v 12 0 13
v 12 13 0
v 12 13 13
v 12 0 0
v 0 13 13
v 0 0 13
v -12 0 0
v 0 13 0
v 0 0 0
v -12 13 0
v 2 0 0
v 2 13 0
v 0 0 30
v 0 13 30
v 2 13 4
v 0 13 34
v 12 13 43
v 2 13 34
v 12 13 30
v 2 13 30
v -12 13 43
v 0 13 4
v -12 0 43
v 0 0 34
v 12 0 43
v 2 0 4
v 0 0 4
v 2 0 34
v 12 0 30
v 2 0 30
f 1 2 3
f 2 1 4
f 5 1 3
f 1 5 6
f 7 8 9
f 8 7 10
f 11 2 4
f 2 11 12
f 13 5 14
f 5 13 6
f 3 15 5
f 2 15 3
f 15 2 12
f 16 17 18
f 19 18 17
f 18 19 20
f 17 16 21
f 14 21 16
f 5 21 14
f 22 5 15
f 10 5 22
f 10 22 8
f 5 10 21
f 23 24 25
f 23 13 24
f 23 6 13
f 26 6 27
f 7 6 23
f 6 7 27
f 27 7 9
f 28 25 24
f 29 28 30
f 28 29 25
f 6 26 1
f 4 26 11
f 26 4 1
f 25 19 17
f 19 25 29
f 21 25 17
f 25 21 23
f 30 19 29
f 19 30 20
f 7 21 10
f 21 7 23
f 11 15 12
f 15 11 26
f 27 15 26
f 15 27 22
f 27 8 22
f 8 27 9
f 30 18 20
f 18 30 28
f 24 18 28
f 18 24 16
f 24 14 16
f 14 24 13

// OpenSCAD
/*
Create a closet self hook for 3D printing
By: Dave Borghuis / zeno4ever
Version : 1.0
Date : 22-10-2014
For sugestions email me at : dave@daveborghuis.nl
*/

//Hight of the holes
hookhight = 13;

//Depth of the self support
hookdepth = 12; 

//Distance between holes
hookdistance = 17; 

//width of the whole hook
hookwidth = 13; 

//Depth of the hook
holedepth = 12; 

cutdepth = 2; 
cuthigth = 4;


module hook()
{
	difference() {
		//base blok
		union() {
			cube([holedepth,hookwidth,hookhight]);
			translate([0,0,hookdistance+hookhight]) cube([holedepth,hookwidth,hookhight]);
			translate ([-hookdepth,0,0]) cube([hookdepth,hookwidth,hookdistance+2*hookhight]);
		}
		//make holes
		{
			cube([cutdepth,hookwidth,cuthigth]);
			translate([0,0,hookdistance+hookhight]) cube([cutdepth,hookwidth,cuthigth]);
		}
	}
}

hook();
